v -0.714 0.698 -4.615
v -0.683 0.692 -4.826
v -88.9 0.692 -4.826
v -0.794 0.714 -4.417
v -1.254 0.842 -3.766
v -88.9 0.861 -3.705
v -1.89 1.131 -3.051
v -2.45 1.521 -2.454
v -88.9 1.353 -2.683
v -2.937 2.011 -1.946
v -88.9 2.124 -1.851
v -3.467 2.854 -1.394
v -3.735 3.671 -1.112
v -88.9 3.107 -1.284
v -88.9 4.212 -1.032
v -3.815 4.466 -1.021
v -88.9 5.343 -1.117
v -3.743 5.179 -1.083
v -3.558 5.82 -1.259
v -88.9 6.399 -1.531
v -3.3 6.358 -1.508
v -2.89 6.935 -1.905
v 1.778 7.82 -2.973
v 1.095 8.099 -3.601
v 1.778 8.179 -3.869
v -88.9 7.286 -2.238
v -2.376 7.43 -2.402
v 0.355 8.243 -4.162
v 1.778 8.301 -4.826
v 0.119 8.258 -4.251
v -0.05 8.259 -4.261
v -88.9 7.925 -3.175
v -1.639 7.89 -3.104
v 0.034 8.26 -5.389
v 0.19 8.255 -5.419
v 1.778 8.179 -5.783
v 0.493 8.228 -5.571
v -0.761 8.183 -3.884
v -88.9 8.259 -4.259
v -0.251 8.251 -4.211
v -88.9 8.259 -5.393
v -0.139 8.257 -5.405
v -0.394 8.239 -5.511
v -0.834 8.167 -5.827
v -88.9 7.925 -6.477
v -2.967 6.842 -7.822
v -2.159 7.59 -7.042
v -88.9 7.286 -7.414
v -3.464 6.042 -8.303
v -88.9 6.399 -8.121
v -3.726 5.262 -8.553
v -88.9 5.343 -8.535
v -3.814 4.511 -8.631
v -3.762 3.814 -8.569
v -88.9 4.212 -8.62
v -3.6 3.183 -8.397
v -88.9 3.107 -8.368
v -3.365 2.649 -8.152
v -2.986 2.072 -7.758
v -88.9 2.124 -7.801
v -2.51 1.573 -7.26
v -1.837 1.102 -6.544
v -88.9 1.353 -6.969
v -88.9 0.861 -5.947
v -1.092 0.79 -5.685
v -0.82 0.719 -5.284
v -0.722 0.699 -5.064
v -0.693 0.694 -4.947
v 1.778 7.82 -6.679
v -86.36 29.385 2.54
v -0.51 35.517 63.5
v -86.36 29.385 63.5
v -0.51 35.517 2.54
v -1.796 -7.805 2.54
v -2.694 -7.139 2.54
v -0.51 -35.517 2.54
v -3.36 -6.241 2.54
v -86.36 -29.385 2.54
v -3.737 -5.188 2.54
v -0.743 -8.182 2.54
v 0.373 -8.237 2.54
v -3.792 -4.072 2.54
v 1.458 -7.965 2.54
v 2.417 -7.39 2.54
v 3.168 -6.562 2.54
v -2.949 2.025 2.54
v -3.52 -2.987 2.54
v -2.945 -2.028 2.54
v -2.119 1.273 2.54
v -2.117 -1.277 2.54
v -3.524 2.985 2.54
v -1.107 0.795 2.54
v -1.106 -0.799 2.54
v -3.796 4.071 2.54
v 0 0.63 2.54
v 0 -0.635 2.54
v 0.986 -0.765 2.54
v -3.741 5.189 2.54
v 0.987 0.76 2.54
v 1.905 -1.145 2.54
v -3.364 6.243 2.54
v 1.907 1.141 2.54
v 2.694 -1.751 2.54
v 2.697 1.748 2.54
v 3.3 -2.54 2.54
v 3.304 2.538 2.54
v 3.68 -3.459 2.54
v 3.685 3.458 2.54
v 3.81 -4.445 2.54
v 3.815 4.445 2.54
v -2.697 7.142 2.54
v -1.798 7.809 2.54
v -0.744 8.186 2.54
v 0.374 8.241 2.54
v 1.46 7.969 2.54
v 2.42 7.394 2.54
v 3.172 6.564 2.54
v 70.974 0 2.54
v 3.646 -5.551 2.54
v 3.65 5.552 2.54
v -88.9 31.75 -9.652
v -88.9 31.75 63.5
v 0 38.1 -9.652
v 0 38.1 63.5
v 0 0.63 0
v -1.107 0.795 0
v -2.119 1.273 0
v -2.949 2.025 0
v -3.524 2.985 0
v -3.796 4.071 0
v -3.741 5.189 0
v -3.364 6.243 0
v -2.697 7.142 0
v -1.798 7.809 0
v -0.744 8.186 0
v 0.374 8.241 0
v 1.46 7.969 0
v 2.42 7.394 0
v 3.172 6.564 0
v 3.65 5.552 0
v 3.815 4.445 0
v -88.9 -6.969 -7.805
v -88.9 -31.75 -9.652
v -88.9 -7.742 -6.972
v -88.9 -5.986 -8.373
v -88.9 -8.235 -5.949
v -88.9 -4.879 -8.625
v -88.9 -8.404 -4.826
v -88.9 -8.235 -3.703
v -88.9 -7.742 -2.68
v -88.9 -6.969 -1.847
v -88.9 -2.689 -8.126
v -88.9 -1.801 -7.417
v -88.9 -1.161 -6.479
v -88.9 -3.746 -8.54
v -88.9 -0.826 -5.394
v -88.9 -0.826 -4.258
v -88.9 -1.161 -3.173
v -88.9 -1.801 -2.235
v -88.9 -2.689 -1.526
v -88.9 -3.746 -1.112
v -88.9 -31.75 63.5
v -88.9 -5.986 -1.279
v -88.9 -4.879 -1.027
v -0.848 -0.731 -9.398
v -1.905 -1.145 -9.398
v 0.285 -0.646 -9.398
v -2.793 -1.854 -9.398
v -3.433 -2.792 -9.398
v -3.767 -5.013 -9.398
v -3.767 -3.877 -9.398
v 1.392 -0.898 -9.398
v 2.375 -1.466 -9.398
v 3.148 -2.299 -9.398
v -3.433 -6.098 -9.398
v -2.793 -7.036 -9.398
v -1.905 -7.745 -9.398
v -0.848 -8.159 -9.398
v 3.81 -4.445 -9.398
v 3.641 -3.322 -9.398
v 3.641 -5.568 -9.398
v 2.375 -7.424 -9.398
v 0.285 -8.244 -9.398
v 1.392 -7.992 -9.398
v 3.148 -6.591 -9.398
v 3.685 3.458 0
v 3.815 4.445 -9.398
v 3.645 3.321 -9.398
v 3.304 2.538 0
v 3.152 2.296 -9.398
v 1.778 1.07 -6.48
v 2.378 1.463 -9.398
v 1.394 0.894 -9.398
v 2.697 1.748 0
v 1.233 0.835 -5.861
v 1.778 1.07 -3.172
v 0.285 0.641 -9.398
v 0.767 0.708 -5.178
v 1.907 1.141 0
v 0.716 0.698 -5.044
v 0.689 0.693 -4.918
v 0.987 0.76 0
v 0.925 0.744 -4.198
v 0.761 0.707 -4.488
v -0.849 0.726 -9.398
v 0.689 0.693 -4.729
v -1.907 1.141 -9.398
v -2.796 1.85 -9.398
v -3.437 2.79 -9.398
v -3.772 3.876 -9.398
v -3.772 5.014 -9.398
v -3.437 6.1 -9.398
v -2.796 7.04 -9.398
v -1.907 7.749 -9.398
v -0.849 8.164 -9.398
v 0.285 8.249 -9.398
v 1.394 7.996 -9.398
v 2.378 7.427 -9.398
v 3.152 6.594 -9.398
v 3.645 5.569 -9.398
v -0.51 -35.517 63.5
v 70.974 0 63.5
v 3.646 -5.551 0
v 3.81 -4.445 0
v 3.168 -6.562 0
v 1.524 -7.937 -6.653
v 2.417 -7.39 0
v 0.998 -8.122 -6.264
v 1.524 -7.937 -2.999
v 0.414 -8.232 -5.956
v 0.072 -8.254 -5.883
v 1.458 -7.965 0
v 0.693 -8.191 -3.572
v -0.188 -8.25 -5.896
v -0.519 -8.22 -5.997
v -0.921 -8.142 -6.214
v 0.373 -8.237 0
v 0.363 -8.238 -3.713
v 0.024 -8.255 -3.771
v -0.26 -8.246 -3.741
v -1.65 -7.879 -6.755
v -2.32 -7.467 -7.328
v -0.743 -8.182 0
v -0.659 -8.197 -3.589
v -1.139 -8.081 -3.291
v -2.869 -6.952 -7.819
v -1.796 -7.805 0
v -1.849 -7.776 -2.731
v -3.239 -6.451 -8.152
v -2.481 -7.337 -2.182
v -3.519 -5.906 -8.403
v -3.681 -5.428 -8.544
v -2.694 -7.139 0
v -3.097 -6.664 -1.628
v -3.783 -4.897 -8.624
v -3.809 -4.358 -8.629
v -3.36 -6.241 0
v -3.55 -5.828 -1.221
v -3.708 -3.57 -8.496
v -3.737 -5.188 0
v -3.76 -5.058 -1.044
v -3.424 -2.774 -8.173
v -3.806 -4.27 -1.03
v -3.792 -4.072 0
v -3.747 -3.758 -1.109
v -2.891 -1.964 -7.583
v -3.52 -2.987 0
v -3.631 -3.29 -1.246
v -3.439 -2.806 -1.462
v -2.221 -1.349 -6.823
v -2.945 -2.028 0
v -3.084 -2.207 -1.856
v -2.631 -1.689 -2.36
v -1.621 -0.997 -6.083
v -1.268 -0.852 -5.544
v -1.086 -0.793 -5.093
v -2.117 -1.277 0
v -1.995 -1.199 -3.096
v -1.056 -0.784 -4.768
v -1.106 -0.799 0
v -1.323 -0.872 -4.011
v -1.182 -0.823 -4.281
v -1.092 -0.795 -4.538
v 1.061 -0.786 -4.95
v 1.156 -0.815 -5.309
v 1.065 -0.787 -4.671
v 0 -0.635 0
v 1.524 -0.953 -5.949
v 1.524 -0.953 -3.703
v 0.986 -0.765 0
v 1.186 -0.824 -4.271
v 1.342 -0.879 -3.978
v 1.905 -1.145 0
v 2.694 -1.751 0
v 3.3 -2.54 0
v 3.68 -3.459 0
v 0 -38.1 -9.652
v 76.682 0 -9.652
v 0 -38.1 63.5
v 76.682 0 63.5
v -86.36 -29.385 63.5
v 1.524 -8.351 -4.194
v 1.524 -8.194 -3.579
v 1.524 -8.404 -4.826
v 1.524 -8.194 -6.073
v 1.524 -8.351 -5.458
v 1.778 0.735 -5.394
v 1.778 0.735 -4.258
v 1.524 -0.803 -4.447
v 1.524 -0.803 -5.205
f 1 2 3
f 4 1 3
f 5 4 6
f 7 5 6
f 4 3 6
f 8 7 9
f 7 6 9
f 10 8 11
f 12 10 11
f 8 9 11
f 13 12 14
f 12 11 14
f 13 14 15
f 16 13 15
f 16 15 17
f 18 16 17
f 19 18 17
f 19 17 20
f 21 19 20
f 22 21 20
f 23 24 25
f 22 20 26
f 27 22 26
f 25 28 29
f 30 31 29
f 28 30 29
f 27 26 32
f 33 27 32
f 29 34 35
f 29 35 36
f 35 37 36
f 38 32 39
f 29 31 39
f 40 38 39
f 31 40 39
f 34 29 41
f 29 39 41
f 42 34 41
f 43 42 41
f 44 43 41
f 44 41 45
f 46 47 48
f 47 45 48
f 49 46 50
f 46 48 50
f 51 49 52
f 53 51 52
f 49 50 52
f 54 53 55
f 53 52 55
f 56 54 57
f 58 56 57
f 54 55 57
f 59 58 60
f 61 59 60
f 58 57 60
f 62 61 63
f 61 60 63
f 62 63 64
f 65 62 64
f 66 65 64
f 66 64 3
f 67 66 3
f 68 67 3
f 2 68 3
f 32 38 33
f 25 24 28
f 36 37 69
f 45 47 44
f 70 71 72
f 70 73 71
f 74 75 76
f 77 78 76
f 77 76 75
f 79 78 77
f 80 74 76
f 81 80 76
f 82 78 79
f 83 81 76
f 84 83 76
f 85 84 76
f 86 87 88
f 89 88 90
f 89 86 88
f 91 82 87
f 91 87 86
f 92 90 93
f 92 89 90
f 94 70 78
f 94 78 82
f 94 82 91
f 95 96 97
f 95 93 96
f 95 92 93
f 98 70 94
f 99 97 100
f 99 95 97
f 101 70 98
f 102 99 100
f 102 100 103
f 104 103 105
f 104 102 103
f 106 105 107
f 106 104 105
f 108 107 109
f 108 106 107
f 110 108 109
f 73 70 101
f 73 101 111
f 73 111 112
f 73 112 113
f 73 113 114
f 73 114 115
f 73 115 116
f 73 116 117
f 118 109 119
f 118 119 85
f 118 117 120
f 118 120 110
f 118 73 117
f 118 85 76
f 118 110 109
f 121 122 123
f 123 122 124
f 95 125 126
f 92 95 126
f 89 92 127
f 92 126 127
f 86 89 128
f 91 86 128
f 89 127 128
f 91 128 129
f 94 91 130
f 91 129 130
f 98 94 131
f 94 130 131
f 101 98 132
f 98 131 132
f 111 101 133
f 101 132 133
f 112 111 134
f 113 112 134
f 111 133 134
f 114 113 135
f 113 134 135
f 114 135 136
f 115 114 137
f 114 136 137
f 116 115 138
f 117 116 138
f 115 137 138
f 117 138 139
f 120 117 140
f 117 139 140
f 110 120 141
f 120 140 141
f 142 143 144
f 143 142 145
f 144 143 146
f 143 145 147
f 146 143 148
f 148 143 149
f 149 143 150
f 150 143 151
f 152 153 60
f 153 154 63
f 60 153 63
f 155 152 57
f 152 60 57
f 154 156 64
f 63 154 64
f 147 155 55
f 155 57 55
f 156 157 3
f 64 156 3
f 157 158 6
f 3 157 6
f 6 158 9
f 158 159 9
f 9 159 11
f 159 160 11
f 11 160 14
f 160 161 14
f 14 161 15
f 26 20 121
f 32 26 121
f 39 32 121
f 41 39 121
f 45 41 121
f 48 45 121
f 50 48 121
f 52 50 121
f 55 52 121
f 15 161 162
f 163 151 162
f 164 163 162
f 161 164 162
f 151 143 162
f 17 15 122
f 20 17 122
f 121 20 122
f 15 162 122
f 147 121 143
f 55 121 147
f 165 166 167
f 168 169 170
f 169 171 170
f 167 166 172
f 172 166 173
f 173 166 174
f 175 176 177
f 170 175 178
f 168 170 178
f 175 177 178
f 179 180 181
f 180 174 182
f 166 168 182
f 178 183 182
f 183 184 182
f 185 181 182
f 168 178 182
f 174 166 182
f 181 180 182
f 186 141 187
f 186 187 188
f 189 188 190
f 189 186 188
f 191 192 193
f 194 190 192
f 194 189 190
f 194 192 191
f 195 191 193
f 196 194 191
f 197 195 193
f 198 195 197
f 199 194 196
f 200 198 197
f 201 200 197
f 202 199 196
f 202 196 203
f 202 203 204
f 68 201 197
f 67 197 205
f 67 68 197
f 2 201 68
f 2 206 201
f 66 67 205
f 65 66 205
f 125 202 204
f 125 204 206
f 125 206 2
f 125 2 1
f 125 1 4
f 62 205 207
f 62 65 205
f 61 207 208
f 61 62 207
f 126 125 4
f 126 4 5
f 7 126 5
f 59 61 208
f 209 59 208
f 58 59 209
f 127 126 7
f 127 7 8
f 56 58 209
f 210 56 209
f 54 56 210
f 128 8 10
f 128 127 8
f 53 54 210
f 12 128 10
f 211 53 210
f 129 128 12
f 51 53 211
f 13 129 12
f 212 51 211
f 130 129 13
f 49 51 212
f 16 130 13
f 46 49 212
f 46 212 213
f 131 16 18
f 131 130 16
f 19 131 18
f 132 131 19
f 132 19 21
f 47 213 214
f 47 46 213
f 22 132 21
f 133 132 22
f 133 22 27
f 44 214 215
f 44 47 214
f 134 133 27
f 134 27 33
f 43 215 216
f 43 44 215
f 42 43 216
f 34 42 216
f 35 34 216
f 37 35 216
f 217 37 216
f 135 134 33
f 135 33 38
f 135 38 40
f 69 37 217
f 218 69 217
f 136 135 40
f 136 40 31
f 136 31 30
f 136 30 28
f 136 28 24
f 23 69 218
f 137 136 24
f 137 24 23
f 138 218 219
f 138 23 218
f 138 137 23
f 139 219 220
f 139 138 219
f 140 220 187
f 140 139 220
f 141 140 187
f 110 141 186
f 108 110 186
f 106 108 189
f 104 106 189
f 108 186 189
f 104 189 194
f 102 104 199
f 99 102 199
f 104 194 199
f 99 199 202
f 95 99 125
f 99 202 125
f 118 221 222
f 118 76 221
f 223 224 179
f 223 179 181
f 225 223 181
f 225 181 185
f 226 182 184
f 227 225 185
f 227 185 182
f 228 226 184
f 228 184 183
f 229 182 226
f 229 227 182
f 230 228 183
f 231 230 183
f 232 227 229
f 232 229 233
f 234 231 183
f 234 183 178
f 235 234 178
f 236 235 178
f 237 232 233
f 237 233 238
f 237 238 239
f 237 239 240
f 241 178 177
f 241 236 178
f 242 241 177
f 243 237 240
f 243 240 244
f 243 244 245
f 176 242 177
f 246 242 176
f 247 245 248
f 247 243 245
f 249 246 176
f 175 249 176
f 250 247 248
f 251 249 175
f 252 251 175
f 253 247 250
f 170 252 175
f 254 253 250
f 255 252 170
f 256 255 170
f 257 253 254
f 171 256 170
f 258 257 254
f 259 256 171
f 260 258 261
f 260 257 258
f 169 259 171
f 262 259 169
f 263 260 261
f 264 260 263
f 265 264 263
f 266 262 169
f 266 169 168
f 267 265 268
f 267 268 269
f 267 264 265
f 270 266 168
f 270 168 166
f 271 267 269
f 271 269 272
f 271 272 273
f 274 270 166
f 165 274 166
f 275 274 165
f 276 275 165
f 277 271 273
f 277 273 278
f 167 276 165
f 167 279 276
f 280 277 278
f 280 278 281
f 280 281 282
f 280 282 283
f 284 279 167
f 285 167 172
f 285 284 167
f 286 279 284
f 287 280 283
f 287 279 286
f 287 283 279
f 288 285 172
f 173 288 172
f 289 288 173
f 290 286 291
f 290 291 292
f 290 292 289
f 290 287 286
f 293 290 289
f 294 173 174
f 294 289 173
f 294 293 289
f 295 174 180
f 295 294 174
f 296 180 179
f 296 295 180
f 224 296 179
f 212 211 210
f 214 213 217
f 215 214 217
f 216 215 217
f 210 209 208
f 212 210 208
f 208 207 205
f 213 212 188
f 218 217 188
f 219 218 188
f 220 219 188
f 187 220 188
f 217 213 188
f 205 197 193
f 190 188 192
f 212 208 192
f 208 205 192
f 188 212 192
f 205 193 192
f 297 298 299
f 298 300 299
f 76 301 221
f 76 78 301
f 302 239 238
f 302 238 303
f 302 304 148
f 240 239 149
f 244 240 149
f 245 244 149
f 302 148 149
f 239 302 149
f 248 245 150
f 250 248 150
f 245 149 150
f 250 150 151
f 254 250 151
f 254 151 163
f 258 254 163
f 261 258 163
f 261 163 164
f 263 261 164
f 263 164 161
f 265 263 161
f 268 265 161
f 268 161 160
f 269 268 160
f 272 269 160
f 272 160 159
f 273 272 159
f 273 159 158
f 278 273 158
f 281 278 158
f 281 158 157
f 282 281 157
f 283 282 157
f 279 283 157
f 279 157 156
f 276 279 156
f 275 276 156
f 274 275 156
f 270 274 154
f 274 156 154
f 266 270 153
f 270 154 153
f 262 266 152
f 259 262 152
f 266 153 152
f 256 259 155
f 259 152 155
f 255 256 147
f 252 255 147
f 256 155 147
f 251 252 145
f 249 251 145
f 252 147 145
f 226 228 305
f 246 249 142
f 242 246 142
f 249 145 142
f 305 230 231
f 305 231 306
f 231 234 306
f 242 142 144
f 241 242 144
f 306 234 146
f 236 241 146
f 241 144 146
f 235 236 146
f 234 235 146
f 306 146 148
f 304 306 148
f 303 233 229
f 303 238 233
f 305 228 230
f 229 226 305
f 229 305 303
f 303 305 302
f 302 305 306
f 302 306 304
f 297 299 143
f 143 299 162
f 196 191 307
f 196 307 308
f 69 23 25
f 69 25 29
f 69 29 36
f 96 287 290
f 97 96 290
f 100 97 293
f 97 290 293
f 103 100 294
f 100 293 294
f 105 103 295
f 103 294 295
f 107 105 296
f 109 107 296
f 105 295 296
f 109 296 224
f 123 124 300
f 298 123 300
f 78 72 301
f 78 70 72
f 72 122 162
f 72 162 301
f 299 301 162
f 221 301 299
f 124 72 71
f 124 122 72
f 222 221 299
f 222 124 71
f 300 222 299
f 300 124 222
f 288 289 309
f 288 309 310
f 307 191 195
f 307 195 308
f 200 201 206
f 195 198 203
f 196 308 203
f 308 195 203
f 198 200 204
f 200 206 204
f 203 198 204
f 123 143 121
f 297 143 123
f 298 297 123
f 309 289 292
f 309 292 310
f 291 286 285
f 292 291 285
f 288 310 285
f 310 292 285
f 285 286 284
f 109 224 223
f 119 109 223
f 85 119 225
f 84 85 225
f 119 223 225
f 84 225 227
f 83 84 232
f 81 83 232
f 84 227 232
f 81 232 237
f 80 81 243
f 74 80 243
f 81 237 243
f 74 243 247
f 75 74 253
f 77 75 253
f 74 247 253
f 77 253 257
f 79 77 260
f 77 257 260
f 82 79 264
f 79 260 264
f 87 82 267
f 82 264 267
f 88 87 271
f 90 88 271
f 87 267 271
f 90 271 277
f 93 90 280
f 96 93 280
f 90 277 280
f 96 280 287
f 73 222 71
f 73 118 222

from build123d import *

# Parameters (mm, degrees)
F1_DEPTH    = 63.5
F2_T        = -2.54
F4_DEPTH    = 25.4
F1_FACE_R   = 3.81
F1_FACE_R_2 = 3.814678
F5_DEPTH    = 9.652
F7_R        = 3.80479
F8_DEPTH    = 90.678
F9_DEPTH    = 0.254
F7_R_2      = 3.81
F10_DEPTH   = 90.424
F11_R       = 3.910877
F12_DEPTH   = 0.254


with BuildPart() as f1:
    # F0 (on Top) → F1 (new body)
    with BuildSketch(Plane.XY):
        Polygon((76.681964, 0), (0, 38.1), (0, 0), (0, -38.1), align=None)
        Polygon((0, 0), (0, 38.1), (-88.9, 31.75), (-88.9, 0), align=None)
        Polygon((0, -38.1), (0, 0), (-88.9, 0), (-88.9, -31.75), align=None)
    extrude(amount=F1_DEPTH)

    # F2
    f2_openings = [f1.faces().sort_by_distance(p)[0] for p in [
        (-21.133783, 0, 63.5),
    ]]
    offset(amount=F2_T, openings=f2_openings)

    # F3 (on face) → F4 (cut)
    with BuildSketch(Plane(origin=(0, 0, 0), x_dir=(1, 0, 0), z_dir=(0, 0, -1))):
        with BuildLine():
            ThreePointArc((3.814678, -4.445), (2.697385, -1.747615), (0, -0.630322))
            ThreePointArc((0, -0.630322), (-2.697385, -7.142385), (3.814678, -4.445))
        make_face()
        with BuildLine():
            ThreePointArc((3.81, 4.445), (-2.694077, 7.139077), (0, 0.635))
            ThreePointArc((0, 0.635), (2.694077, 1.750923), (3.81, 4.445))
        make_face()
    extrude(amount=-F4_DEPTH, mode=Mode.SUBTRACT)

    # F1_face (on face) → F5 (join)
    with BuildSketch(Plane(origin=(-21.133783, 0, 0), x_dir=(1, 0, 0), z_dir=(0, 0, -1))):
        Polygon((21.133783, -38.1), (97.815747, 0), (21.133783, 38.1), (-67.766217, 31.75), (-67.766217, -31.75), align=None)
        with Locations((21.133783, 4.445)):
            Circle(F1_FACE_R, mode=Mode.SUBTRACT)
        with Locations((21.133783, -4.445)):
            Circle(F1_FACE_R_2, mode=Mode.SUBTRACT)
    extrude(amount=F5_DEPTH)

    # F7 (on face) → F8 (cut)
    with BuildSketch(Plane(origin=(-88.9, 0, 0), x_dir=(0, -1, 0), z_dir=(-1, 0, 0))):
        with Locations((-4.496679, -4.826)):
            Circle(F7_R)
    extrude(amount=-F8_DEPTH, mode=Mode.SUBTRACT)

    # F6 (on face) → F9 (join)
    with BuildSketch(Plane(origin=(0, 0, -9.652), x_dir=(1, 0, 0), z_dir=(0, 0, -1))):
        with BuildLine():
            ThreePointArc((3.814678, -4.445), (0, -0.630322), (-3.814678, -4.445))
            ThreePointArc((-3.814678, -4.445), (0, -8.259678), (3.814678, -4.445))
        make_face()
    extrude(amount=-F9_DEPTH)

    # F7 (on face) → F10 (cut)
    with BuildSketch(Plane(origin=(-88.9, 0, 0), x_dir=(0, -1, 0), z_dir=(-1, 0, 0))):
        with Locations((4.593814, -4.826)):
            Circle(F7_R_2)
    extrude(amount=-F10_DEPTH, mode=Mode.SUBTRACT)

    # F11 (on face) → F12 (join)
    with BuildSketch(Plane(origin=(0, 0, -9.652), x_dir=(1, 0, 0), z_dir=(0, 0, -1))):
        with Locations((0, 4.445)):
            Circle(F11_R)
    extrude(amount=-F12_DEPTH)


solid = f1.part
